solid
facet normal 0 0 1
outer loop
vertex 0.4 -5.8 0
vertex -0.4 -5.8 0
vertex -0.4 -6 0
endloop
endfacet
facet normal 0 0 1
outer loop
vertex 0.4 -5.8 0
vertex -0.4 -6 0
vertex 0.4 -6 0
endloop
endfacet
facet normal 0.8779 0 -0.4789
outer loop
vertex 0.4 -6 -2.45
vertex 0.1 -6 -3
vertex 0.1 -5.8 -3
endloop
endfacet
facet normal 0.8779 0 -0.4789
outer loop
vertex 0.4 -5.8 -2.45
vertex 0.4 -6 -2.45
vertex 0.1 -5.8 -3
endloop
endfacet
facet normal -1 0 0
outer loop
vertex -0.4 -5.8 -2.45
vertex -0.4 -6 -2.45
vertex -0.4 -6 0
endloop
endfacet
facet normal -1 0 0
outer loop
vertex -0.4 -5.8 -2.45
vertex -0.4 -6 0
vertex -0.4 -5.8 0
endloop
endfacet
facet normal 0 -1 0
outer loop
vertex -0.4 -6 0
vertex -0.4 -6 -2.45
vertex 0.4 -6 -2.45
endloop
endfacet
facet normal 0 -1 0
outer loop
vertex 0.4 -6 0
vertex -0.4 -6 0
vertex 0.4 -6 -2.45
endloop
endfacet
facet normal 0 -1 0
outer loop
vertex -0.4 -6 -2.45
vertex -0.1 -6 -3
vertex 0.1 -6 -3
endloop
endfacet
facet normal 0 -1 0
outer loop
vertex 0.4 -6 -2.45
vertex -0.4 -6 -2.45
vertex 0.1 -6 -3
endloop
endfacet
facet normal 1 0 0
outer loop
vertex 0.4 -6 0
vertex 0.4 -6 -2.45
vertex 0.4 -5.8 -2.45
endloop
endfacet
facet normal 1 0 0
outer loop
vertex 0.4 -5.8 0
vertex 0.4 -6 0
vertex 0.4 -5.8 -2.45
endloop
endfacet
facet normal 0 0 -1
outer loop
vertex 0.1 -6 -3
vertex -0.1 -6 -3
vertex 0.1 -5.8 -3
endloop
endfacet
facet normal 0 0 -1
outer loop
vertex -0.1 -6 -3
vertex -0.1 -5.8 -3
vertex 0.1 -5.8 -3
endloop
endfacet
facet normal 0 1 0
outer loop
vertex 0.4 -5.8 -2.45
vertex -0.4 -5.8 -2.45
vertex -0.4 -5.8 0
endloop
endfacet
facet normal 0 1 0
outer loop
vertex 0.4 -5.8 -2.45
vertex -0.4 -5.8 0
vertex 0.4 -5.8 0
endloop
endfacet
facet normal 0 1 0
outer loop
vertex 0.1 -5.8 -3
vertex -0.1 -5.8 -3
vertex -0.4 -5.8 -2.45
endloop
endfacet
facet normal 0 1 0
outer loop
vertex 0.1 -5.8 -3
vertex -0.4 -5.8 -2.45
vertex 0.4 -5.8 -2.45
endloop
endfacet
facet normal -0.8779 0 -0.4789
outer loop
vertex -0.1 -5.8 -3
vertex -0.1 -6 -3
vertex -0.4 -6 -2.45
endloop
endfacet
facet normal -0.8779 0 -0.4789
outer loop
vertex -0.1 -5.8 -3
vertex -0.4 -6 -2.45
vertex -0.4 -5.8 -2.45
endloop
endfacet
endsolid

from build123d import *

# Parameters (mm, degrees)
BOX031_W           = 0.8
BOX031_H           = 0.2
BOX031_DEPTH       = 3
CHAMFER019_1_SIZE2 = 0.3
CHAMFER019_1_SIZE  = 0.55
CHAMFER019_2_SIZE2 = 0.3
CHAMFER019_2_SIZE  = 0.55


with BuildPart() as part:
    # Box031 → Box031 (new body)
    with BuildSketch(Plane(origin=(-0.4, -6, -3), x_dir=(1, 0, 0), z_dir=(0, 0, 1))):
        with Locations((0.4, 0.1)):
            Rectangle(BOX031_W, BOX031_H)
    extrude(amount=BOX031_DEPTH)

    # Chamfer019 1
    chamfer019_1_edges = [part.edges().sort_by_distance(p)[0] for p in [
        (0.4, -5.9, -3),
    ]]
    chamfer019_1_side = part.faces().sort_by_distance((0.4, -5.9, -1.5))[0]
    chamfer(chamfer019_1_edges, length=CHAMFER019_1_SIZE, length2=CHAMFER019_1_SIZE2, reference=chamfer019_1_side)

    # Chamfer019 2
    chamfer019_2_edges = [part.edges().sort_by_distance(p)[0] for p in [
        (-0.4, -5.9, -3),
    ]]
    chamfer019_2_side = part.faces().sort_by_distance((-0.4, -5.9, -1.5))[0]
    chamfer(chamfer019_2_edges, length=CHAMFER019_2_SIZE, length2=CHAMFER019_2_SIZE2, reference=chamfer019_2_side)


solid = part.part
